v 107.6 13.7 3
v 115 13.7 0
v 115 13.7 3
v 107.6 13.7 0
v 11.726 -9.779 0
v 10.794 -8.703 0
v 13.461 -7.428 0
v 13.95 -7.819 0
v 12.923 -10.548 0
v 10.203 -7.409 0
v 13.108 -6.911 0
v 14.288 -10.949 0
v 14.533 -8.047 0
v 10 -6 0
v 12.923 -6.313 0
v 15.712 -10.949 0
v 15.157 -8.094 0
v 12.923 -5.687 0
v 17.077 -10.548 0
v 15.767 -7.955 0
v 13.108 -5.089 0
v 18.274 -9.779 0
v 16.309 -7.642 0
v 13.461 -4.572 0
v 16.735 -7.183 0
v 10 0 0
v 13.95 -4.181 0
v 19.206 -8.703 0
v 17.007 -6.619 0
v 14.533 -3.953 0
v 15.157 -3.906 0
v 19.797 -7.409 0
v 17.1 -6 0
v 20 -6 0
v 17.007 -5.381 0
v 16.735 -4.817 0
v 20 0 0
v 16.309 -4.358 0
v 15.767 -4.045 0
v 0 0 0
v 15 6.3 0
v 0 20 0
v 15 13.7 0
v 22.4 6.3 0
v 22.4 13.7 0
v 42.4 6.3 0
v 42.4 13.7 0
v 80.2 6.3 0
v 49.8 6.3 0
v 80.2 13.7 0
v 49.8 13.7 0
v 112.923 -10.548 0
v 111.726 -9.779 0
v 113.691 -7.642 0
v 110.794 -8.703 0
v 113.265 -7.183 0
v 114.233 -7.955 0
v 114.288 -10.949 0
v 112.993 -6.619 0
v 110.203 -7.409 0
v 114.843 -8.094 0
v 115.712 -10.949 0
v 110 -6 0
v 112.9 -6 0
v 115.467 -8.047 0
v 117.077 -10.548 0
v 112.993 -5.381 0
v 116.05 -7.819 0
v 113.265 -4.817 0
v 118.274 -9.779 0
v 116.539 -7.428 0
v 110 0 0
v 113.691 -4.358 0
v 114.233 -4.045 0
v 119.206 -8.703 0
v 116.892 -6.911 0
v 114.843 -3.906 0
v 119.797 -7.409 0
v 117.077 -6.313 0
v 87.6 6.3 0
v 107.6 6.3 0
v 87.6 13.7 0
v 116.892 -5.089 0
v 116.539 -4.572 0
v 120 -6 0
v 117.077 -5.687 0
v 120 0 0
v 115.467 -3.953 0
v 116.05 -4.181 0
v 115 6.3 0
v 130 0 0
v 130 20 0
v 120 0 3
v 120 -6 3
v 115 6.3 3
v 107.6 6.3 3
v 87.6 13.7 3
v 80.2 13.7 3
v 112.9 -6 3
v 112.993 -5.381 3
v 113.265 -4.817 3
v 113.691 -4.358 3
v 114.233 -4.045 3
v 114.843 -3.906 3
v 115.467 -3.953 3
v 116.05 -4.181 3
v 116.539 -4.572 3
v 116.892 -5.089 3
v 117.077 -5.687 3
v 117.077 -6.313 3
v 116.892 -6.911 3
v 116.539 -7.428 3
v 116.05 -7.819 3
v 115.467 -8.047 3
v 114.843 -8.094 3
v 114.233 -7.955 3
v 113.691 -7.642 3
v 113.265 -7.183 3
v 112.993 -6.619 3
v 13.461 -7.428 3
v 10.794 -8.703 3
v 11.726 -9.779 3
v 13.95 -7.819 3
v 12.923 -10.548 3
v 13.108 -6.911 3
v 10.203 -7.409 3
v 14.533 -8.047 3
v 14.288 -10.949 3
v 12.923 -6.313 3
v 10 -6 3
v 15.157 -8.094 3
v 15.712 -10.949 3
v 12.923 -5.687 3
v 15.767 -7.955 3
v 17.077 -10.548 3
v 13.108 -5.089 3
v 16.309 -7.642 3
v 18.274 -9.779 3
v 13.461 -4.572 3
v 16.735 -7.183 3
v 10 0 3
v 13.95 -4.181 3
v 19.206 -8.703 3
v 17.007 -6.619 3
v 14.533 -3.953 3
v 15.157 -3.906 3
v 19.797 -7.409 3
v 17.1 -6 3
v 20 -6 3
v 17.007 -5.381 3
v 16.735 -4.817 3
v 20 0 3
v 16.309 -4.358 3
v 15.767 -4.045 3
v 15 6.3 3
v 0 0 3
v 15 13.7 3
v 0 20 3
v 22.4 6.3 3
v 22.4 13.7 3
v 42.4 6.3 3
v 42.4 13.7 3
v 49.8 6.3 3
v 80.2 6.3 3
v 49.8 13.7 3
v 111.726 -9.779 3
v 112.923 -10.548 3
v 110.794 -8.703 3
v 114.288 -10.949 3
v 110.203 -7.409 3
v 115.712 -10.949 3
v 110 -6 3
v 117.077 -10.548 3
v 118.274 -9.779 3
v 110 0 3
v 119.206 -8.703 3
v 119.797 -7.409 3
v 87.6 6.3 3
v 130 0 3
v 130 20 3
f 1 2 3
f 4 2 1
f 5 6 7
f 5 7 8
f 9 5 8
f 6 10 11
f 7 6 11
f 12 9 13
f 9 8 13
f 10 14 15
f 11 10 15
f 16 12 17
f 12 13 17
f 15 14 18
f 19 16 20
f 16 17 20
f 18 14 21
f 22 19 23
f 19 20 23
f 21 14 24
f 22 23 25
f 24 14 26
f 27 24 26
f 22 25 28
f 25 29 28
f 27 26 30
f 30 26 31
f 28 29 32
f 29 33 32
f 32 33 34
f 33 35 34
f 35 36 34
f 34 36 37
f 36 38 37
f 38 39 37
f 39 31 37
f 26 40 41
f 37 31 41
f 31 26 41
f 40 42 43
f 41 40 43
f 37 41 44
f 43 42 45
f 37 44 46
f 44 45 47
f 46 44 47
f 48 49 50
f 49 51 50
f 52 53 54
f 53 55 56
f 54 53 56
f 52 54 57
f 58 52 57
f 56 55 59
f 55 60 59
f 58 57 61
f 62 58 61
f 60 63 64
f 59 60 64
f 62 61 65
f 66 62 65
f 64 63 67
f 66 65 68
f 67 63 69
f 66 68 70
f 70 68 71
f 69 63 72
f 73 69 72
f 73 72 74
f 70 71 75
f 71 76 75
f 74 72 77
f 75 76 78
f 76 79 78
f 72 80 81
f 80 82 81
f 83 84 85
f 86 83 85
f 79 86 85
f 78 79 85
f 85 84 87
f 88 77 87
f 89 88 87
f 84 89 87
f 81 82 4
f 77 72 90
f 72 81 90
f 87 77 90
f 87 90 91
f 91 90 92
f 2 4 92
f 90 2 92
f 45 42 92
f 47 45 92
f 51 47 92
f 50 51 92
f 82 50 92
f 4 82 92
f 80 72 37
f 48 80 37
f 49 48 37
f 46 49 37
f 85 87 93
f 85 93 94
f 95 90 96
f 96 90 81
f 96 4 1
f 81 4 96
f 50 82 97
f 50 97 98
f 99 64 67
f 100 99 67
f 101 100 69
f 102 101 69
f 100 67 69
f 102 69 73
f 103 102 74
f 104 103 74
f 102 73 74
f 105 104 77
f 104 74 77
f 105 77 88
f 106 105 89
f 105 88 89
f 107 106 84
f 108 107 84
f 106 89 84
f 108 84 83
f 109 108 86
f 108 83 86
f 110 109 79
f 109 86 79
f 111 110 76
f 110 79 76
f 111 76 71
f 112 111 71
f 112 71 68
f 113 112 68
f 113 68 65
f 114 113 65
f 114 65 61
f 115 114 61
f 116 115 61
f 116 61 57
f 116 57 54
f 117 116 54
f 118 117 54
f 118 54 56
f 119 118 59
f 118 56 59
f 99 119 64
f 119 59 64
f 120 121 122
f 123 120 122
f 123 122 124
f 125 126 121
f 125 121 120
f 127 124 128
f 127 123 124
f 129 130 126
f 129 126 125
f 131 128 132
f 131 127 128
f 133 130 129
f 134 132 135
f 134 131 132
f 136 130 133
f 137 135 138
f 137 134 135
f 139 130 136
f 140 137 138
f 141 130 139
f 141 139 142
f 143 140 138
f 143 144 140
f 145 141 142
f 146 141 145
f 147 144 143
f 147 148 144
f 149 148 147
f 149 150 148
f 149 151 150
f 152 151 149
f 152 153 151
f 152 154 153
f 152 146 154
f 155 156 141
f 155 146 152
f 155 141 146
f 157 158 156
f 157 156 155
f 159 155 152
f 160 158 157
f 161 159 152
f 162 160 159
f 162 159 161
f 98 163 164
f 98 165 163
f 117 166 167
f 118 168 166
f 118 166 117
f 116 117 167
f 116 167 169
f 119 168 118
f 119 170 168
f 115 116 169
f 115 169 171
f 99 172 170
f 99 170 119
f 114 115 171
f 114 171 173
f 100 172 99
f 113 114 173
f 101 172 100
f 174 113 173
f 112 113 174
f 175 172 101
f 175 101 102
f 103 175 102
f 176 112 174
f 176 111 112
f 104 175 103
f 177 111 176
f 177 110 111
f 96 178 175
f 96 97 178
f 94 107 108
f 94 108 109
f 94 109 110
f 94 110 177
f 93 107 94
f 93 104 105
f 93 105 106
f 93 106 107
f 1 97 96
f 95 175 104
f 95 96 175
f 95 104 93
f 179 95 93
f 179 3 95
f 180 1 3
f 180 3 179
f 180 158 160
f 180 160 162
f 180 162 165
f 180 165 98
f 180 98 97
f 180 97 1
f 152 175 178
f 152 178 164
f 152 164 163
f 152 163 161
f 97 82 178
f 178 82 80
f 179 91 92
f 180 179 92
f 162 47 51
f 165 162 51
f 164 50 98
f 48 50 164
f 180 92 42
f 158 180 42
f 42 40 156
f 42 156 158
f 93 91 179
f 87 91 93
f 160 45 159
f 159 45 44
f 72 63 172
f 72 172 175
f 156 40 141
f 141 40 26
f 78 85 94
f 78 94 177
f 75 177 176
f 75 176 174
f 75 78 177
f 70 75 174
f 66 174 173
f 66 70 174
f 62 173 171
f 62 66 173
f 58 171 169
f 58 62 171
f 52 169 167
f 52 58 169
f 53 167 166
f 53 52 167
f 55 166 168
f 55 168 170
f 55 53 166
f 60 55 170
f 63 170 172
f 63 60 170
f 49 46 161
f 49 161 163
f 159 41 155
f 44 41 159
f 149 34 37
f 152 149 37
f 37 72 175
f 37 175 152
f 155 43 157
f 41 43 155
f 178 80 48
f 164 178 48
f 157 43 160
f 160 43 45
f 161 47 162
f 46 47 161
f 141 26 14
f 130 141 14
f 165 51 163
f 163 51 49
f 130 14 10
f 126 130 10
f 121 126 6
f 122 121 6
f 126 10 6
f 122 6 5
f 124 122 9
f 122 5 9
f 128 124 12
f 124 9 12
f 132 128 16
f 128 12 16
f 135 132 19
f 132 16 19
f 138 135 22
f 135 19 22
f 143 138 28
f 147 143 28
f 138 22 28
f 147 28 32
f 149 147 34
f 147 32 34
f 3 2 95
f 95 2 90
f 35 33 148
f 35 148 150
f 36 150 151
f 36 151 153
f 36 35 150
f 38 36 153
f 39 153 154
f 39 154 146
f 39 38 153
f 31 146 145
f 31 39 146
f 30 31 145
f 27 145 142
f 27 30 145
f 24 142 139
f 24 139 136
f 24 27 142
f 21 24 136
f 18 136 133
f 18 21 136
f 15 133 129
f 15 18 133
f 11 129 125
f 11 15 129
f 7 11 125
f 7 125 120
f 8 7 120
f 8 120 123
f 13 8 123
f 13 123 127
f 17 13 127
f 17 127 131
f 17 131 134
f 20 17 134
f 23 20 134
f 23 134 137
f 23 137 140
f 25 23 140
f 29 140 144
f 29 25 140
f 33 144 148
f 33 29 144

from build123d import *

# Parameters (mm, degrees)
SKETCH_R     = 2.1
PAD_DEPTH    = 3
SKETCH001_W  = 7.4
SKETCH001_H  = 7.4
POCKET_DEPTH = 5


with BuildPart() as pocket:
    # Sketch → Pad (new body)
    with BuildSketch(Plane.XY):
        with BuildLine():
            Line((0, 20), (65, 20))
            Line((65, 20), (65, 0))
            Line((20, 0), (65, 0))
            Line((20, -6), (20, 0))
            ThreePointArc((10, -6), (15, -11), (20, -6))
            Line((10, 0), (10, -6))
            Line((0, 0), (10, 0))
            Line((0, 0), (0, 20))
        make_face()
        with Locations((15, -6)):
            Circle(SKETCH_R, mode=Mode.SUBTRACT)
    extrude(amount=PAD_DEPTH)

    # Sketch001 → Pocket (cut)
    with BuildSketch(Plane(origin=(0, 0, 0), x_dir=(1, 0, 0), z_dir=(0, 0, -1))):
        with Locations((18.7, -10)):
            Rectangle(SKETCH001_W, SKETCH001_H)
        with Locations((46.1, -10)):
            Rectangle(SKETCH001_W, SKETCH001_H)
    extrude(amount=-POCKET_DEPTH, mode=Mode.SUBTRACT)


with BuildPart() as part_mirroring:
    # Part__Mirroring: instance of Pocket
    add(pocket.part.mirror(Plane(origin=(0, 0, 0), x_dir=(0, -1, 0), z_dir=(1, 0, 0))))


with BuildPart() as part_mirroring_1:
    # Part__Mirroring placement: moved
    add(part_mirroring.part.moved(Location((130, 0, 0))))


with BuildPart() as fusion:
    # Fusion base: copy of Pocket
    add(pocket.part)

    # Fusion: union Part__Mirroring
    add(part_mirroring_1.part)


solid = fusion.part
